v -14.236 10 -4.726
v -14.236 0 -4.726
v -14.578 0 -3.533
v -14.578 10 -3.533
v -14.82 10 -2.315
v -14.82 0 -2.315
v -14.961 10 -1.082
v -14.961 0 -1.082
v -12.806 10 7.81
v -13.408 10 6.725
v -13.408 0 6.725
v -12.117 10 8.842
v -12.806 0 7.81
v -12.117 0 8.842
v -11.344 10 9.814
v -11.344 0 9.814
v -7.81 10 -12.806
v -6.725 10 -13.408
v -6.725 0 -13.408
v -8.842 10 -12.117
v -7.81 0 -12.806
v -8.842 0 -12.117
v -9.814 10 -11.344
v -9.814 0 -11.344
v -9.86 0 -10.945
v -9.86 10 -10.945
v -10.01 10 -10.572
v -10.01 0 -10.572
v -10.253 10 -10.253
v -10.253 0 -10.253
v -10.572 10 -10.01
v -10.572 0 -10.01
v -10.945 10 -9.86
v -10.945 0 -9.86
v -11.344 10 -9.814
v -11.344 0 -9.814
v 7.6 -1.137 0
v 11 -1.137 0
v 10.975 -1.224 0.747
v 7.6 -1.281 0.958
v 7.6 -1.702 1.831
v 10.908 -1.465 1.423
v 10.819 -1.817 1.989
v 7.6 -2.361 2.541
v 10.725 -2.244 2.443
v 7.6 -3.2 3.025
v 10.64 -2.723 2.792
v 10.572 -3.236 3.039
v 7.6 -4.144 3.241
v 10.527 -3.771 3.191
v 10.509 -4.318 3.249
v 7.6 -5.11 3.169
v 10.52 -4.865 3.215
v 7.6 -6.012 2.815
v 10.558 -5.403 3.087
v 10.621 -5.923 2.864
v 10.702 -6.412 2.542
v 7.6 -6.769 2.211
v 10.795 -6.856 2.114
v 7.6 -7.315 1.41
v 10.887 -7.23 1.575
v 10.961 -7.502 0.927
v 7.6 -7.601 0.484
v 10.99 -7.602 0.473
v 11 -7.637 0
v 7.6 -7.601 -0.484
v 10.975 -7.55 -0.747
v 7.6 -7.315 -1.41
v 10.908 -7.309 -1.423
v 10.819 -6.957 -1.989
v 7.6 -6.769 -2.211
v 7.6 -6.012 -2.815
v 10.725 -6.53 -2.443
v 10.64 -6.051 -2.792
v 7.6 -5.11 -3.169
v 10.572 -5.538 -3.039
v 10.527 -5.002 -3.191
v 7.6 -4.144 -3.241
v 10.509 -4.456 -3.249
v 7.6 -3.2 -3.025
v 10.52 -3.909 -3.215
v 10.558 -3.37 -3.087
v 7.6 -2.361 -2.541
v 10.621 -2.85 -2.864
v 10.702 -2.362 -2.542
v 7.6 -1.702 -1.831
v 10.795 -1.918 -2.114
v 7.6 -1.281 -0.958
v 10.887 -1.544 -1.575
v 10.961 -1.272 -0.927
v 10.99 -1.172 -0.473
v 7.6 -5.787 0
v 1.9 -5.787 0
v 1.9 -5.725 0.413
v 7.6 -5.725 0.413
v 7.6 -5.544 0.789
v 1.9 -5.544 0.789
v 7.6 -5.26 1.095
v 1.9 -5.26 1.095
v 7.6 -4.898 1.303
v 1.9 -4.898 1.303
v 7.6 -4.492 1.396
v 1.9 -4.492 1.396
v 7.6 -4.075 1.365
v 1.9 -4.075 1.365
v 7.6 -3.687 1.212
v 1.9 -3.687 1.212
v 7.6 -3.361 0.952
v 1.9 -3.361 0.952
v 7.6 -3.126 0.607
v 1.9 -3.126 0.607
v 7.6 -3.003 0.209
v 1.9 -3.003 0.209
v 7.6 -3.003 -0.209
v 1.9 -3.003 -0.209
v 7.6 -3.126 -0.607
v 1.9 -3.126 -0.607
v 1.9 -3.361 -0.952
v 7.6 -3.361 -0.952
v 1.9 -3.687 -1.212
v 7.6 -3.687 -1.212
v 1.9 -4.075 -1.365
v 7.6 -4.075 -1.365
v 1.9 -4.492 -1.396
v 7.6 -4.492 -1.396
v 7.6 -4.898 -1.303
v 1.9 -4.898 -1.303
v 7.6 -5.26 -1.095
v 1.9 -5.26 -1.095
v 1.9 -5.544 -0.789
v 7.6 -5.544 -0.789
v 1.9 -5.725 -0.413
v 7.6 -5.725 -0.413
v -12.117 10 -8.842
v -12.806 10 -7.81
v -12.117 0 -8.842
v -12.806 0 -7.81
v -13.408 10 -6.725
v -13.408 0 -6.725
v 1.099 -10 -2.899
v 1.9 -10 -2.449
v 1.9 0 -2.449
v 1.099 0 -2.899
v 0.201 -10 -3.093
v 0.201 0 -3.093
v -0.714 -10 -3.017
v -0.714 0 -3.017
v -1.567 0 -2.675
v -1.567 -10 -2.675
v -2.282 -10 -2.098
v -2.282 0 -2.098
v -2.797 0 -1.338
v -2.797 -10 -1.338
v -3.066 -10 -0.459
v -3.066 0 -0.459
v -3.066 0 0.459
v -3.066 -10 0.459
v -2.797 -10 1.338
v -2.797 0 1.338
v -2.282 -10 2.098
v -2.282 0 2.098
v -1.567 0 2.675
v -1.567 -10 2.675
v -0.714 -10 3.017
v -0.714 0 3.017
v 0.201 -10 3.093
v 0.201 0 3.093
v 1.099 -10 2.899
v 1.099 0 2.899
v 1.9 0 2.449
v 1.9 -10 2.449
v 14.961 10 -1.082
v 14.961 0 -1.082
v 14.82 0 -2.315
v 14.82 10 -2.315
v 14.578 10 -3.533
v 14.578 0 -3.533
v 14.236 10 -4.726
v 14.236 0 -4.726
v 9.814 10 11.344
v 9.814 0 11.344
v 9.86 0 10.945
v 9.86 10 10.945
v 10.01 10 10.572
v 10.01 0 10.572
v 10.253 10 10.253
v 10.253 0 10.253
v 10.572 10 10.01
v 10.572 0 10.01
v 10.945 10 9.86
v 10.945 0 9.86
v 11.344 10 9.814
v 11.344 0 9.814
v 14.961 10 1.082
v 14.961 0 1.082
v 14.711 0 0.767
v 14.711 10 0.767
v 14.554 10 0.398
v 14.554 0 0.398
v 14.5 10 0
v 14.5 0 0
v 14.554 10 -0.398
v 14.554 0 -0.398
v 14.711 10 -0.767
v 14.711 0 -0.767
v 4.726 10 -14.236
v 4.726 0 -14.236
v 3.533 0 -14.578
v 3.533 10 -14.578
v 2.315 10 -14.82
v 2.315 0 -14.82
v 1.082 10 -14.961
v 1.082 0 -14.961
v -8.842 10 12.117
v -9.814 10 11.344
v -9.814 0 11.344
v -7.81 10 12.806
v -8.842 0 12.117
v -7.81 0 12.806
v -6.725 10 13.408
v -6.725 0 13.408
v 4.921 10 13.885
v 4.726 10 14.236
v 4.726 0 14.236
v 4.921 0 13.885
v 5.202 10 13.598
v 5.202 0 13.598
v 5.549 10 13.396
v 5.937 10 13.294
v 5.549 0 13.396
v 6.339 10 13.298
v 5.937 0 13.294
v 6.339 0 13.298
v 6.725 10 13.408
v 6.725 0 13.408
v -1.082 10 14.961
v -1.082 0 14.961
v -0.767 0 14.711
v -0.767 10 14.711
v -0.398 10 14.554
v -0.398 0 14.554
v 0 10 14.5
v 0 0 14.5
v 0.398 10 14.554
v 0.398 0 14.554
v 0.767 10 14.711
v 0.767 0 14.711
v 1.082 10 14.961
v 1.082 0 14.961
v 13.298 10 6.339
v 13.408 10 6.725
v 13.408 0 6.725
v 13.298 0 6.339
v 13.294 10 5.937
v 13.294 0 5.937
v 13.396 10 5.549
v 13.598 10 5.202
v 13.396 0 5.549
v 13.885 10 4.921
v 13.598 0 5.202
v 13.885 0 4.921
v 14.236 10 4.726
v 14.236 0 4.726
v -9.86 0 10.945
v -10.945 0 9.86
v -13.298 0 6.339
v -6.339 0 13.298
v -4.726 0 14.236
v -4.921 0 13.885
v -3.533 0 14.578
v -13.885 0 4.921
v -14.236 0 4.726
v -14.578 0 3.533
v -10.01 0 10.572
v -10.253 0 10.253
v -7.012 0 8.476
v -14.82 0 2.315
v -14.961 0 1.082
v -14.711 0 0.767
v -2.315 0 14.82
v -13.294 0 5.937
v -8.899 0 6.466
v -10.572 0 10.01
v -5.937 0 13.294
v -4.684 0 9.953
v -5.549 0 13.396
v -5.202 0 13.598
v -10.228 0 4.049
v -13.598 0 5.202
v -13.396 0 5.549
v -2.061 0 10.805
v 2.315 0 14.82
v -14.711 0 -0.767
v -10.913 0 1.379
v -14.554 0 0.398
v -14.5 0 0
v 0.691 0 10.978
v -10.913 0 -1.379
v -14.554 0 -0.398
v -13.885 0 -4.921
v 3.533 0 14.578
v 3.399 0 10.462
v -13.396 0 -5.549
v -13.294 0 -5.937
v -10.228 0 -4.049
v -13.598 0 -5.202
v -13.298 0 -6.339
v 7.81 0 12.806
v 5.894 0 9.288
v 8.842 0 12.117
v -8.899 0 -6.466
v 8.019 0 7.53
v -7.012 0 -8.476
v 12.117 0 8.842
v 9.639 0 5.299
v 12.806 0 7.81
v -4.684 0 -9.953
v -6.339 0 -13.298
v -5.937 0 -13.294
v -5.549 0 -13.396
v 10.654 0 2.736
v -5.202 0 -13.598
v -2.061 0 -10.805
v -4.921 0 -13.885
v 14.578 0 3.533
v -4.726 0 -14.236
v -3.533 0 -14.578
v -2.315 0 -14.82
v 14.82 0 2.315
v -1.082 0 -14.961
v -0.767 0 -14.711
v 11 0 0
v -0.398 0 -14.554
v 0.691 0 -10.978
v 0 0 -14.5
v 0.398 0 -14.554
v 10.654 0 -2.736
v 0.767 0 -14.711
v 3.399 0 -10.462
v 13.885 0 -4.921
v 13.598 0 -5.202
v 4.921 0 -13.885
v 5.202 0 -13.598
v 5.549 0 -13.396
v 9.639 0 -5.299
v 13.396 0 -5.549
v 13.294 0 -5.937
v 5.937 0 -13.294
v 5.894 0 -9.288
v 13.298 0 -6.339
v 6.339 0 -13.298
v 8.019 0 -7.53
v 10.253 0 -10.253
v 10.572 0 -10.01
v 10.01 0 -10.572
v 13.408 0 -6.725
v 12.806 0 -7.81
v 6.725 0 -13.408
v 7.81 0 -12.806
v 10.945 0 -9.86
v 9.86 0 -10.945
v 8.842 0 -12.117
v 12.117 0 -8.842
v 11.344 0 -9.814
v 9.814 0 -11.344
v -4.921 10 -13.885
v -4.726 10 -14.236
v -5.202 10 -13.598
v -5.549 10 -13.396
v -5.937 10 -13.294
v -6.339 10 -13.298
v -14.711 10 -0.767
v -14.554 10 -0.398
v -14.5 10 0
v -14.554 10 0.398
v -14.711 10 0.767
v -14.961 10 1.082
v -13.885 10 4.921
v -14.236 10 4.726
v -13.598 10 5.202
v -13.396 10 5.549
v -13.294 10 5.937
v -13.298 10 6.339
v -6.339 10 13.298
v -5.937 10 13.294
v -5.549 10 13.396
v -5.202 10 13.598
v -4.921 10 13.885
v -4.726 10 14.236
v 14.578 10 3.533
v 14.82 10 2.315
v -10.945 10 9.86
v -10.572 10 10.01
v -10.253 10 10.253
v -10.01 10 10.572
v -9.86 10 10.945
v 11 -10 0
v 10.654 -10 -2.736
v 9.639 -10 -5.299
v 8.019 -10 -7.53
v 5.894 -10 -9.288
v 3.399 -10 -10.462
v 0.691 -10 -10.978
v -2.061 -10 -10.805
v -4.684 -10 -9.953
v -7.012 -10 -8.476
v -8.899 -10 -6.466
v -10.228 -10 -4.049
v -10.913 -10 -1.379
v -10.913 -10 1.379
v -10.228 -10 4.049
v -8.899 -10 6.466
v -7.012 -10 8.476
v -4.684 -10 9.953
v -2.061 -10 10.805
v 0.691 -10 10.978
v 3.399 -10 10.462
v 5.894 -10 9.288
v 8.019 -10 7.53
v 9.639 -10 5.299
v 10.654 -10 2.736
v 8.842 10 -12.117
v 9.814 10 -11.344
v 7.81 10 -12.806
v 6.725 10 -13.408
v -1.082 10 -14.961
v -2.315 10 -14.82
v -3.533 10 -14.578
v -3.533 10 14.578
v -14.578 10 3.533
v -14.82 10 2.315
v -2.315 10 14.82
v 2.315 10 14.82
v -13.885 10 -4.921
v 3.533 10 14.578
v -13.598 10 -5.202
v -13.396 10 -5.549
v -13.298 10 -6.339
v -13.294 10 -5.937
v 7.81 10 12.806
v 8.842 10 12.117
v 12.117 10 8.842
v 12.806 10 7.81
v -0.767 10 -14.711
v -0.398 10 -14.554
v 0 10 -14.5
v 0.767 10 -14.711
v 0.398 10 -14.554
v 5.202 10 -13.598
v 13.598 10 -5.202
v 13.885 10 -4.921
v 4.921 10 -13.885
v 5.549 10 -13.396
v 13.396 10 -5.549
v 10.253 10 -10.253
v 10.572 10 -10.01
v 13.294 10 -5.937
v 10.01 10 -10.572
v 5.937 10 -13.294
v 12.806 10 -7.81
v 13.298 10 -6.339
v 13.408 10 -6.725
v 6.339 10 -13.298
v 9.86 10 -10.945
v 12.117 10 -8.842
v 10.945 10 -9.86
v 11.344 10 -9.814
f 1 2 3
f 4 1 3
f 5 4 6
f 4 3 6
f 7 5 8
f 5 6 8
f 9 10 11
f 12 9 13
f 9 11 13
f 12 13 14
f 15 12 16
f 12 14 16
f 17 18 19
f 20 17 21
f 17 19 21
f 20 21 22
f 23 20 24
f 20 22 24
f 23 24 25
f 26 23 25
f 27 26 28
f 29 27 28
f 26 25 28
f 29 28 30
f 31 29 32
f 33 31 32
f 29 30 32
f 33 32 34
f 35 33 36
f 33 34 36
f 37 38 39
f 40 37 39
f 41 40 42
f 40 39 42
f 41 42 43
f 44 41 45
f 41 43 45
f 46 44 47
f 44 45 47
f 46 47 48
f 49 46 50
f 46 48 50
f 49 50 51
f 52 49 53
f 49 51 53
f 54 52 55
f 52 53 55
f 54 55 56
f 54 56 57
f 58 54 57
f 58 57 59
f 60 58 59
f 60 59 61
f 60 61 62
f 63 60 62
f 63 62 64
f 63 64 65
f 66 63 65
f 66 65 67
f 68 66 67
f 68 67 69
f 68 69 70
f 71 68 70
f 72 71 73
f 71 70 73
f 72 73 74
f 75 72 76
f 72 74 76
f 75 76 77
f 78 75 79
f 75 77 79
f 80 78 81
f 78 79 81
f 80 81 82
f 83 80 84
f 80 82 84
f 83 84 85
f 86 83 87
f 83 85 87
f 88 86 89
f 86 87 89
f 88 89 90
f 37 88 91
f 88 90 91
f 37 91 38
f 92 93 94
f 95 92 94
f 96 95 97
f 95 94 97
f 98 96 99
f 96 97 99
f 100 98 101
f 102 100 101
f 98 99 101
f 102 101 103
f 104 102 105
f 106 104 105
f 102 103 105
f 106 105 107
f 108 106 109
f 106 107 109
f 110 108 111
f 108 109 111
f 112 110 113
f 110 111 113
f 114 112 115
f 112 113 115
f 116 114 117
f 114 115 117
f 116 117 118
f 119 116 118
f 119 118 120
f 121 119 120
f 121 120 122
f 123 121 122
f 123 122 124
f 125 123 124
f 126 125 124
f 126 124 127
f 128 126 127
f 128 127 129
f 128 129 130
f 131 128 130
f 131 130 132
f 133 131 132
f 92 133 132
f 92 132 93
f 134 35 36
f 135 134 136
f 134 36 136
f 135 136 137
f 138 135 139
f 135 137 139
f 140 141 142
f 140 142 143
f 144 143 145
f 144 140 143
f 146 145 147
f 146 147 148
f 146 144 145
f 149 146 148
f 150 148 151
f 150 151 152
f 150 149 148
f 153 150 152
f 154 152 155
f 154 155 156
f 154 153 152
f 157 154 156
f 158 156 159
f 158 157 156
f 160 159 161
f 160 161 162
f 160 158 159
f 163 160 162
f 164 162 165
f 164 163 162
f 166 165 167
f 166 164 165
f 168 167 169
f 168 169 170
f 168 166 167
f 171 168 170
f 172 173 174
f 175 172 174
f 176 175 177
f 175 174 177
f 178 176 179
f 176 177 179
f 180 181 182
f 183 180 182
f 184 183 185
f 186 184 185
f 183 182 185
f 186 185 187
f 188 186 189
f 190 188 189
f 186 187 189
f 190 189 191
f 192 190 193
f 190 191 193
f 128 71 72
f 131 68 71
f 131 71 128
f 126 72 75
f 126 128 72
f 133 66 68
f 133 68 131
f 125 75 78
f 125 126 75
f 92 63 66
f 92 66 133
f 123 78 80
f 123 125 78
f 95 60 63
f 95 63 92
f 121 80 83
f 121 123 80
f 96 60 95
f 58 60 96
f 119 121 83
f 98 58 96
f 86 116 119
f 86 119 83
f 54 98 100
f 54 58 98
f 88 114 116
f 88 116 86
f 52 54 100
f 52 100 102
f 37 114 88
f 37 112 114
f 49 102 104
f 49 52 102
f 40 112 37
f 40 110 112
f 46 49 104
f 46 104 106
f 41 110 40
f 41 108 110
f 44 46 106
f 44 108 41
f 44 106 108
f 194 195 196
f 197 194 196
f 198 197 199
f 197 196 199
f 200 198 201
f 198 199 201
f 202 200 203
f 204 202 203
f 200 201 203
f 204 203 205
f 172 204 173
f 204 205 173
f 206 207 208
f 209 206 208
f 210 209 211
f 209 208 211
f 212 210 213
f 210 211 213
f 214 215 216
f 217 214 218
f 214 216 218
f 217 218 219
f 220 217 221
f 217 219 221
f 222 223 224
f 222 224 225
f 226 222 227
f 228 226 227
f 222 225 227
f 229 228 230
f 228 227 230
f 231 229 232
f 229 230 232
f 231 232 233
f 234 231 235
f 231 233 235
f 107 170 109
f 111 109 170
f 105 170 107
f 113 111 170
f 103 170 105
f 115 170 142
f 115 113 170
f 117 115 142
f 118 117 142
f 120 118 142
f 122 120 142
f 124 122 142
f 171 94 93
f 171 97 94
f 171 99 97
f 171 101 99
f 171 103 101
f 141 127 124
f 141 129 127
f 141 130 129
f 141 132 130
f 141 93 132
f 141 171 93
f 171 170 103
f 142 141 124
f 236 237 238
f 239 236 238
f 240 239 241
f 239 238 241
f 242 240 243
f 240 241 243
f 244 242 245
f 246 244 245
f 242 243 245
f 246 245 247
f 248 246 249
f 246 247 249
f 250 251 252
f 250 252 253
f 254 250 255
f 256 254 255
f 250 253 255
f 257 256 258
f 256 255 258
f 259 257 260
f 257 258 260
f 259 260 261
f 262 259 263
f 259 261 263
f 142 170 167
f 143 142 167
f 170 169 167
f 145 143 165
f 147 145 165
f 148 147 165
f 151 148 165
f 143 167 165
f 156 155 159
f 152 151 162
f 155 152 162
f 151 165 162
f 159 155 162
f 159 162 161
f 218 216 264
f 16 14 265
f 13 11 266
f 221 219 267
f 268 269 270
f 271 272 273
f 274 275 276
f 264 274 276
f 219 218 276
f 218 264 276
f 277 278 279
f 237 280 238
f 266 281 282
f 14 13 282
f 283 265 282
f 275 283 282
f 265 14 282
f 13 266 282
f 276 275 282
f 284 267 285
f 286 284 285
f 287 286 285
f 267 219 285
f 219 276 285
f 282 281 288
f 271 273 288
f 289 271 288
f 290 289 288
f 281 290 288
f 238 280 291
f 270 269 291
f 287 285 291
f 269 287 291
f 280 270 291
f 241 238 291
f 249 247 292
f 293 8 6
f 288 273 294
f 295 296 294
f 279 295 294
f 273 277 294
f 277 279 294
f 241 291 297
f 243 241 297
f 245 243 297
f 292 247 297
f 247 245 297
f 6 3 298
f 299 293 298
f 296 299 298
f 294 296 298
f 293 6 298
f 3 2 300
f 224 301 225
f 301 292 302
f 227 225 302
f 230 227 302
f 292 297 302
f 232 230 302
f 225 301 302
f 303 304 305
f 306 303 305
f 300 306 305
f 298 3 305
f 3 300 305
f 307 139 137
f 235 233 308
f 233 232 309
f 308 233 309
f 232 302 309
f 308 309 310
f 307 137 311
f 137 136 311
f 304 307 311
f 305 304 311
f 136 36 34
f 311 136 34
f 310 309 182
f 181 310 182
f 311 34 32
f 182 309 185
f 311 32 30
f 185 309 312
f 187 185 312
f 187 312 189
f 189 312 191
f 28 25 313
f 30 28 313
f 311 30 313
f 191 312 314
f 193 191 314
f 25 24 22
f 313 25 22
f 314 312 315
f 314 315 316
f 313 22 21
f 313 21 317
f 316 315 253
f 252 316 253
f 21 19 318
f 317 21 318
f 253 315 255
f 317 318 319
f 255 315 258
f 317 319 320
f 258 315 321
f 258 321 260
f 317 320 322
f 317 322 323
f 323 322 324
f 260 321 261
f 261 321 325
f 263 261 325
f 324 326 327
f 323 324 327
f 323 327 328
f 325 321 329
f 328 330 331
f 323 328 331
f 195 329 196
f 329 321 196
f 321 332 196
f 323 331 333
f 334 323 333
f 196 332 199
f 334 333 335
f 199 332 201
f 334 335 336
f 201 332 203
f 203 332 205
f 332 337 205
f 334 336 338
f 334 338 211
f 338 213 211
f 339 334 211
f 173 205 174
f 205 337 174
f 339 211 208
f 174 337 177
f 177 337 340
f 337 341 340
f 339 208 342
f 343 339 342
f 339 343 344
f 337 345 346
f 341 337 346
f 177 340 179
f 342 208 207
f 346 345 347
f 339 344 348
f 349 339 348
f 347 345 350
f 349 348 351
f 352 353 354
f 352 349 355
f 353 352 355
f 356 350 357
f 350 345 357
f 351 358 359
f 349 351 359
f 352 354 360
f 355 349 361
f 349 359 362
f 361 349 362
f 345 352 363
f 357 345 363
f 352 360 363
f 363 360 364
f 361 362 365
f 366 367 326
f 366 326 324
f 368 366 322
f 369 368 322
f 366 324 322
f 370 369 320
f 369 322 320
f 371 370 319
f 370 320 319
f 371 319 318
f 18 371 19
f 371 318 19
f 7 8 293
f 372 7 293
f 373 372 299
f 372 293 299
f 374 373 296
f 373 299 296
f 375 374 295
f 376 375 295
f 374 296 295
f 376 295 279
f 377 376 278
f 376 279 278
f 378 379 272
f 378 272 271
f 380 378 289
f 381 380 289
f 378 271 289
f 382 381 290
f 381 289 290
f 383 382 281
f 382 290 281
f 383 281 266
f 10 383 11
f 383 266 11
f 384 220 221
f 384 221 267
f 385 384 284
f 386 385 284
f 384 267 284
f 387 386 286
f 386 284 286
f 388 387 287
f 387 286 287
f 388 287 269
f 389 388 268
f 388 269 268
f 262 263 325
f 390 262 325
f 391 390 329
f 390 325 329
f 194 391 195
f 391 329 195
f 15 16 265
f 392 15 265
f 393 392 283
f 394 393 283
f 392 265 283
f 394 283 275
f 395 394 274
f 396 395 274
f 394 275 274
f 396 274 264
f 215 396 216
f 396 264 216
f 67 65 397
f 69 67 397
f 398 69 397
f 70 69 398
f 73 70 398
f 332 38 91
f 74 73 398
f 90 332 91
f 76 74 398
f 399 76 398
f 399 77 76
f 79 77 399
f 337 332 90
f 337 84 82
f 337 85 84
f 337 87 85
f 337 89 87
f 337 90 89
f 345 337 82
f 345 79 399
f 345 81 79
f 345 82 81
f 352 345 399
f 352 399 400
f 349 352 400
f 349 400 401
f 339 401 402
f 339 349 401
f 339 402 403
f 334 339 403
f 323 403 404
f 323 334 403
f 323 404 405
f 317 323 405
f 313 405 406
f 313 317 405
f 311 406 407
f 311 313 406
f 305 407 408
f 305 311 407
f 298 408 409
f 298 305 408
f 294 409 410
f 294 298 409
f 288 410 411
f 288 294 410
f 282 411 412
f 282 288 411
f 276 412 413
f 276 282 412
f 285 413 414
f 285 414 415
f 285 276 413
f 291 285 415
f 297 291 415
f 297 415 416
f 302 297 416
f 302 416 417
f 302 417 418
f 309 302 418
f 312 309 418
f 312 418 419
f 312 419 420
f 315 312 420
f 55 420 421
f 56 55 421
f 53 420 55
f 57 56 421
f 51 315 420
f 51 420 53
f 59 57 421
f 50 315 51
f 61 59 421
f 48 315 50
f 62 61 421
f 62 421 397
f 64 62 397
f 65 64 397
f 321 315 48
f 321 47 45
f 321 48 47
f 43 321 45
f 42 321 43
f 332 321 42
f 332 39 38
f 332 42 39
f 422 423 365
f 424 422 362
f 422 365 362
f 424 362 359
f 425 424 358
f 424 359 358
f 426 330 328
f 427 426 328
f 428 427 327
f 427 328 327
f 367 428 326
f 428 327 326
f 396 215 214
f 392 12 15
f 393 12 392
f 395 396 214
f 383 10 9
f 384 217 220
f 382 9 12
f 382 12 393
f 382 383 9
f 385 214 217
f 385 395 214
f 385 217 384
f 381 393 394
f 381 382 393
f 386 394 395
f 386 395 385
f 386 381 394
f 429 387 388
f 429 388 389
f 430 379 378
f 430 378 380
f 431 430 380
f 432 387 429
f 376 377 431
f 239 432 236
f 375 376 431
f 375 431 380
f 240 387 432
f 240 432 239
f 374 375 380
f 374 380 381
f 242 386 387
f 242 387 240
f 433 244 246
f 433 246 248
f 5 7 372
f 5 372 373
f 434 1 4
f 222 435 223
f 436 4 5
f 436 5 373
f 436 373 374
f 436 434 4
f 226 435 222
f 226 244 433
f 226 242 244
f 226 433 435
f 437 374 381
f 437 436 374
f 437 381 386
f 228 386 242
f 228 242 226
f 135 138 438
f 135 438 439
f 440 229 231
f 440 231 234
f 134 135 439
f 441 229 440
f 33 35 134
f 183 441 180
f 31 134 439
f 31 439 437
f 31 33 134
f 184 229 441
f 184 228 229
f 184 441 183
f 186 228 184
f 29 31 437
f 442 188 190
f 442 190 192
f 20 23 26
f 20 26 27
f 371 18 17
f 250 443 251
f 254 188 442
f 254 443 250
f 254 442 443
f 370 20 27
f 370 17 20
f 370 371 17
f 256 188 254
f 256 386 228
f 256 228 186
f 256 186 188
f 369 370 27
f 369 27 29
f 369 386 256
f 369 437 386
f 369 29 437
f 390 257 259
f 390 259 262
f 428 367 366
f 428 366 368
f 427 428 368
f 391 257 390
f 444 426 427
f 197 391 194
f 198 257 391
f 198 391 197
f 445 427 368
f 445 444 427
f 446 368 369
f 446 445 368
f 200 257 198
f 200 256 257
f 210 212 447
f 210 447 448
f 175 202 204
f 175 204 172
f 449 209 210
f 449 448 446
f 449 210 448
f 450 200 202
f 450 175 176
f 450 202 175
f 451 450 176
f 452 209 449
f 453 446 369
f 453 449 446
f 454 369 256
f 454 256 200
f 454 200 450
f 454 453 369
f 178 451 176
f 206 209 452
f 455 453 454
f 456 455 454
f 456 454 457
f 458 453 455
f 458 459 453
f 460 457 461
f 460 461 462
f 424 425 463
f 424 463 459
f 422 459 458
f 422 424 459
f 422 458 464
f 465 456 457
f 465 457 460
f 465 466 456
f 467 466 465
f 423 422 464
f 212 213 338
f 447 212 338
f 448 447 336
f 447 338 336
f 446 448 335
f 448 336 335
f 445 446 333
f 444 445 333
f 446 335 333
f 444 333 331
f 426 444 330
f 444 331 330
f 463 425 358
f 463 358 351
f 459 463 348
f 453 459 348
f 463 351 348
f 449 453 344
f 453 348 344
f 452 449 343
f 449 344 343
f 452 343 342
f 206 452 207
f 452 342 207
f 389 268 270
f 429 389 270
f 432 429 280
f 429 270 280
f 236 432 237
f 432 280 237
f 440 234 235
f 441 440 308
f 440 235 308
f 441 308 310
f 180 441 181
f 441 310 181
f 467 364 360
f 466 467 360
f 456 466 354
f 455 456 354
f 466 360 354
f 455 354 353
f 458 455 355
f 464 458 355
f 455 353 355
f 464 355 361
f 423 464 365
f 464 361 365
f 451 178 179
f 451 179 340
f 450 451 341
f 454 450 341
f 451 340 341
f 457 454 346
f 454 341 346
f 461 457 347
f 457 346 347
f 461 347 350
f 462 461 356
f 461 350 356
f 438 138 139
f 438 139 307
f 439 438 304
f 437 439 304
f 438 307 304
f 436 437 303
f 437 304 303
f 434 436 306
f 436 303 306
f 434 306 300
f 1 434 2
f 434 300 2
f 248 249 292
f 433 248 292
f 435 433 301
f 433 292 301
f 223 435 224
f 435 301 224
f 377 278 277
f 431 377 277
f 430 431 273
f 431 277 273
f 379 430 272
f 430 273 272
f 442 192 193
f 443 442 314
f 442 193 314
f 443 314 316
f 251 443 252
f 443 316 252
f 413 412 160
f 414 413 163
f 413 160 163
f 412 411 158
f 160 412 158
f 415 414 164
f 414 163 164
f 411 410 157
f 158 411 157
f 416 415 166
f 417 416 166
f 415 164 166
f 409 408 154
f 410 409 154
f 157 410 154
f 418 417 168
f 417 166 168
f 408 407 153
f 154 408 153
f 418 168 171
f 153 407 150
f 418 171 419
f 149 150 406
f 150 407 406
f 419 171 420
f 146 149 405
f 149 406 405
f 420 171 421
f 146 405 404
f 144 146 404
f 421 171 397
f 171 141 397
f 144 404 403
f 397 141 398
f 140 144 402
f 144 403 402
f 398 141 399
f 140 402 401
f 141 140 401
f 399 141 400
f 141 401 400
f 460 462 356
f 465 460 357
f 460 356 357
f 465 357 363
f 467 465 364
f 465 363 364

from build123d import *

# Parameters (mm, degrees)
BOSS_EXTRUDE1_DEPTH                                  = 10
SKETCH1_3_R                                          = 11
BOSS_EXTRUDE2_DEPTH                                  = 10
SCHNITT_LINEAR_AUSTRAGEN1_DEPTH                      = 10
STIRNSENKUNG_F_R_M3_ZYLINDERSCHRAUBE_MIT_D           = 2.8
STIRNSENKUNG_F_R_M3_ZYLINDERSCHRAUBE_MIT_DEPTH       = 9.1
STIRNSENKUNG_F_R_M3_ZYLINDERSCHRAUBE_MIT_CBORE_D     = 6.5
STIRNSENKUNG_F_R_M3_ZYLINDERSCHRAUBE_MIT_CBORE_DEPTH = 3.4


with BuildPart() as part:
    # Sketch1 → Boss-Extrude1 (new body)
    with BuildSketch(Plane(origin=(0, 0, 0), x_dir=(1, 0, 0), z_dir=(0, 1, 0))):
        with BuildLine():
            ThreePointArc((-1.081826752, 14.9609375), (-2.92635483, 14.711779206), (-4.72582532, 14.236101118))
            ThreePointArc((-4.72582532, 14.236101118), (-5.548909769, 13.396253221), (-6.724780508, 13.408106769))
            ThreePointArc((-6.724780508, 13.408106769), (-8.333553495, 12.472044185), (-9.814013327, 11.343947391))
            ThreePointArc((-9.814013327, 11.343947391), (-10.253048327, 10.253048327), (-11.343947391, 9.814013327))
            ThreePointArc((-11.343947391, 9.814013327), (-12.472044185, 8.333553495), (-13.408106769, 6.724780508))
            ThreePointArc((-13.408106769, 6.724780508), (-13.396253221, 5.548909769), (-14.236101118, 4.72582532))
            ThreePointArc((-14.236101118, 4.72582532), (-14.711779206, 2.92635483), (-14.9609375, 1.081826752))
            ThreePointArc((-14.9609375, 1.081826752), (-14.5, 0), (-14.9609375, -1.081826752))
            ThreePointArc((-14.9609375, -1.081826752), (-14.711779206, -2.92635483), (-14.236101118, -4.72582532))
            ThreePointArc((-14.236101118, -4.72582532), (-13.396253221, -5.548909769), (-13.408106769, -6.724780508))
            ThreePointArc((-13.408106769, -6.724780508), (-12.472044185, -8.333553495), (-11.343947391, -9.814013327))
            ThreePointArc((-11.343947391, -9.814013327), (-10.253048327, -10.253048327), (-9.814013327, -11.343947391))
            ThreePointArc((-9.814013327, -11.343947391), (-8.333553495, -12.472044185), (-6.724780508, -13.408106769))
            ThreePointArc((-6.724780508, -13.408106769), (-5.548909769, -13.396253221), (-4.72582532, -14.236101118))
            ThreePointArc((-4.72582532, -14.236101118), (-2.92635483, -14.711779206), (-1.081826752, -14.9609375))
            ThreePointArc((-1.081826752, -14.9609375), (0, -14.5), (1.081826752, -14.9609375))
            ThreePointArc((1.081826752, -14.9609375), (2.92635483, -14.711779206), (4.72582532, -14.236101118))
            ThreePointArc((4.72582532, -14.236101118), (5.548909769, -13.396253221), (6.724780508, -13.408106769))
            ThreePointArc((6.724780508, -13.408106769), (8.333553495, -12.472044185), (9.814013327, -11.343947391))
            ThreePointArc((9.814013327, -11.343947391), (10.253048327, -10.253048327), (11.343947391, -9.814013327))
            ThreePointArc((11.343947391, -9.814013327), (12.472044185, -8.333553495), (13.408106769, -6.724780508))
            ThreePointArc((13.408106769, -6.724780508), (13.396253221, -5.548909769), (14.236101118, -4.72582532))
            ThreePointArc((14.236101118, -4.72582532), (14.711779206, -2.92635483), (14.9609375, -1.081826752))
            ThreePointArc((14.9609375, -1.081826752), (14.5, 0), (14.9609375, 1.081826752))
            ThreePointArc((14.9609375, 1.081826752), (14.711779206, 2.92635483), (14.236101118, 4.72582532))
            ThreePointArc((14.236101118, 4.72582532), (13.396253221, 5.548909769), (13.408106769, 6.724780508))
            ThreePointArc((13.408106769, 6.724780508), (12.472044185, 8.333553495), (11.343947391, 9.814013327))
            ThreePointArc((11.343947391, 9.814013327), (10.253048327, 10.253048327), (9.814013327, 11.343947391))
            ThreePointArc((9.814013327, 11.343947391), (8.333553495, 12.472044185), (6.724780508, 13.408106769))
            ThreePointArc((6.724780508, 13.408106769), (5.548909769, 13.396253221), (4.72582532, 14.236101118))
            ThreePointArc((4.72582532, 14.236101118), (2.92635483, 14.711779206), (1.081826752, 14.9609375))
            ThreePointArc((1.081826752, 14.9609375), (0, 14.5), (-1.081826752, 14.9609375))
        make_face()
    extrude(amount=BOSS_EXTRUDE1_DEPTH)

    # Sketch1<3> → Boss-Extrude2 (add)
    with BuildSketch(Plane(origin=(0, 0, 0), x_dir=(1, 0, 0), z_dir=(0, 1, 0))):
        Circle(SKETCH1_3_R)
    extrude(amount=-BOSS_EXTRUDE2_DEPTH)

    # Skizze1 → Schnitt-Linear austragen1 (cut)
    with BuildSketch(Plane.XZ.offset(10)):
        with BuildLine():
            Line((1.9, 2.449489743), (1.9, -2.449489743))
            ThreePointArc((1.9, -2.449489743), (-3.1, 0), (1.9, 2.449489743))
        make_face()
    extrude(amount=-SCHNITT_LINEAR_AUSTRAGEN1_DEPTH, mode=Mode.SUBTRACT)

    # Stirnsenkung für M3 Zylinderschraube mit Innensechskant1
    with Locations(Plane.YZ.offset(11)):
        with Locations((-4.386879559, 0)):
            CounterBoreHole(STIRNSENKUNG_F_R_M3_ZYLINDERSCHRAUBE_MIT_D / 2, STIRNSENKUNG_F_R_M3_ZYLINDERSCHRAUBE_MIT_CBORE_D / 2, STIRNSENKUNG_F_R_M3_ZYLINDERSCHRAUBE_MIT_CBORE_DEPTH, depth=STIRNSENKUNG_F_R_M3_ZYLINDERSCHRAUBE_MIT_DEPTH)


solid = part.part
